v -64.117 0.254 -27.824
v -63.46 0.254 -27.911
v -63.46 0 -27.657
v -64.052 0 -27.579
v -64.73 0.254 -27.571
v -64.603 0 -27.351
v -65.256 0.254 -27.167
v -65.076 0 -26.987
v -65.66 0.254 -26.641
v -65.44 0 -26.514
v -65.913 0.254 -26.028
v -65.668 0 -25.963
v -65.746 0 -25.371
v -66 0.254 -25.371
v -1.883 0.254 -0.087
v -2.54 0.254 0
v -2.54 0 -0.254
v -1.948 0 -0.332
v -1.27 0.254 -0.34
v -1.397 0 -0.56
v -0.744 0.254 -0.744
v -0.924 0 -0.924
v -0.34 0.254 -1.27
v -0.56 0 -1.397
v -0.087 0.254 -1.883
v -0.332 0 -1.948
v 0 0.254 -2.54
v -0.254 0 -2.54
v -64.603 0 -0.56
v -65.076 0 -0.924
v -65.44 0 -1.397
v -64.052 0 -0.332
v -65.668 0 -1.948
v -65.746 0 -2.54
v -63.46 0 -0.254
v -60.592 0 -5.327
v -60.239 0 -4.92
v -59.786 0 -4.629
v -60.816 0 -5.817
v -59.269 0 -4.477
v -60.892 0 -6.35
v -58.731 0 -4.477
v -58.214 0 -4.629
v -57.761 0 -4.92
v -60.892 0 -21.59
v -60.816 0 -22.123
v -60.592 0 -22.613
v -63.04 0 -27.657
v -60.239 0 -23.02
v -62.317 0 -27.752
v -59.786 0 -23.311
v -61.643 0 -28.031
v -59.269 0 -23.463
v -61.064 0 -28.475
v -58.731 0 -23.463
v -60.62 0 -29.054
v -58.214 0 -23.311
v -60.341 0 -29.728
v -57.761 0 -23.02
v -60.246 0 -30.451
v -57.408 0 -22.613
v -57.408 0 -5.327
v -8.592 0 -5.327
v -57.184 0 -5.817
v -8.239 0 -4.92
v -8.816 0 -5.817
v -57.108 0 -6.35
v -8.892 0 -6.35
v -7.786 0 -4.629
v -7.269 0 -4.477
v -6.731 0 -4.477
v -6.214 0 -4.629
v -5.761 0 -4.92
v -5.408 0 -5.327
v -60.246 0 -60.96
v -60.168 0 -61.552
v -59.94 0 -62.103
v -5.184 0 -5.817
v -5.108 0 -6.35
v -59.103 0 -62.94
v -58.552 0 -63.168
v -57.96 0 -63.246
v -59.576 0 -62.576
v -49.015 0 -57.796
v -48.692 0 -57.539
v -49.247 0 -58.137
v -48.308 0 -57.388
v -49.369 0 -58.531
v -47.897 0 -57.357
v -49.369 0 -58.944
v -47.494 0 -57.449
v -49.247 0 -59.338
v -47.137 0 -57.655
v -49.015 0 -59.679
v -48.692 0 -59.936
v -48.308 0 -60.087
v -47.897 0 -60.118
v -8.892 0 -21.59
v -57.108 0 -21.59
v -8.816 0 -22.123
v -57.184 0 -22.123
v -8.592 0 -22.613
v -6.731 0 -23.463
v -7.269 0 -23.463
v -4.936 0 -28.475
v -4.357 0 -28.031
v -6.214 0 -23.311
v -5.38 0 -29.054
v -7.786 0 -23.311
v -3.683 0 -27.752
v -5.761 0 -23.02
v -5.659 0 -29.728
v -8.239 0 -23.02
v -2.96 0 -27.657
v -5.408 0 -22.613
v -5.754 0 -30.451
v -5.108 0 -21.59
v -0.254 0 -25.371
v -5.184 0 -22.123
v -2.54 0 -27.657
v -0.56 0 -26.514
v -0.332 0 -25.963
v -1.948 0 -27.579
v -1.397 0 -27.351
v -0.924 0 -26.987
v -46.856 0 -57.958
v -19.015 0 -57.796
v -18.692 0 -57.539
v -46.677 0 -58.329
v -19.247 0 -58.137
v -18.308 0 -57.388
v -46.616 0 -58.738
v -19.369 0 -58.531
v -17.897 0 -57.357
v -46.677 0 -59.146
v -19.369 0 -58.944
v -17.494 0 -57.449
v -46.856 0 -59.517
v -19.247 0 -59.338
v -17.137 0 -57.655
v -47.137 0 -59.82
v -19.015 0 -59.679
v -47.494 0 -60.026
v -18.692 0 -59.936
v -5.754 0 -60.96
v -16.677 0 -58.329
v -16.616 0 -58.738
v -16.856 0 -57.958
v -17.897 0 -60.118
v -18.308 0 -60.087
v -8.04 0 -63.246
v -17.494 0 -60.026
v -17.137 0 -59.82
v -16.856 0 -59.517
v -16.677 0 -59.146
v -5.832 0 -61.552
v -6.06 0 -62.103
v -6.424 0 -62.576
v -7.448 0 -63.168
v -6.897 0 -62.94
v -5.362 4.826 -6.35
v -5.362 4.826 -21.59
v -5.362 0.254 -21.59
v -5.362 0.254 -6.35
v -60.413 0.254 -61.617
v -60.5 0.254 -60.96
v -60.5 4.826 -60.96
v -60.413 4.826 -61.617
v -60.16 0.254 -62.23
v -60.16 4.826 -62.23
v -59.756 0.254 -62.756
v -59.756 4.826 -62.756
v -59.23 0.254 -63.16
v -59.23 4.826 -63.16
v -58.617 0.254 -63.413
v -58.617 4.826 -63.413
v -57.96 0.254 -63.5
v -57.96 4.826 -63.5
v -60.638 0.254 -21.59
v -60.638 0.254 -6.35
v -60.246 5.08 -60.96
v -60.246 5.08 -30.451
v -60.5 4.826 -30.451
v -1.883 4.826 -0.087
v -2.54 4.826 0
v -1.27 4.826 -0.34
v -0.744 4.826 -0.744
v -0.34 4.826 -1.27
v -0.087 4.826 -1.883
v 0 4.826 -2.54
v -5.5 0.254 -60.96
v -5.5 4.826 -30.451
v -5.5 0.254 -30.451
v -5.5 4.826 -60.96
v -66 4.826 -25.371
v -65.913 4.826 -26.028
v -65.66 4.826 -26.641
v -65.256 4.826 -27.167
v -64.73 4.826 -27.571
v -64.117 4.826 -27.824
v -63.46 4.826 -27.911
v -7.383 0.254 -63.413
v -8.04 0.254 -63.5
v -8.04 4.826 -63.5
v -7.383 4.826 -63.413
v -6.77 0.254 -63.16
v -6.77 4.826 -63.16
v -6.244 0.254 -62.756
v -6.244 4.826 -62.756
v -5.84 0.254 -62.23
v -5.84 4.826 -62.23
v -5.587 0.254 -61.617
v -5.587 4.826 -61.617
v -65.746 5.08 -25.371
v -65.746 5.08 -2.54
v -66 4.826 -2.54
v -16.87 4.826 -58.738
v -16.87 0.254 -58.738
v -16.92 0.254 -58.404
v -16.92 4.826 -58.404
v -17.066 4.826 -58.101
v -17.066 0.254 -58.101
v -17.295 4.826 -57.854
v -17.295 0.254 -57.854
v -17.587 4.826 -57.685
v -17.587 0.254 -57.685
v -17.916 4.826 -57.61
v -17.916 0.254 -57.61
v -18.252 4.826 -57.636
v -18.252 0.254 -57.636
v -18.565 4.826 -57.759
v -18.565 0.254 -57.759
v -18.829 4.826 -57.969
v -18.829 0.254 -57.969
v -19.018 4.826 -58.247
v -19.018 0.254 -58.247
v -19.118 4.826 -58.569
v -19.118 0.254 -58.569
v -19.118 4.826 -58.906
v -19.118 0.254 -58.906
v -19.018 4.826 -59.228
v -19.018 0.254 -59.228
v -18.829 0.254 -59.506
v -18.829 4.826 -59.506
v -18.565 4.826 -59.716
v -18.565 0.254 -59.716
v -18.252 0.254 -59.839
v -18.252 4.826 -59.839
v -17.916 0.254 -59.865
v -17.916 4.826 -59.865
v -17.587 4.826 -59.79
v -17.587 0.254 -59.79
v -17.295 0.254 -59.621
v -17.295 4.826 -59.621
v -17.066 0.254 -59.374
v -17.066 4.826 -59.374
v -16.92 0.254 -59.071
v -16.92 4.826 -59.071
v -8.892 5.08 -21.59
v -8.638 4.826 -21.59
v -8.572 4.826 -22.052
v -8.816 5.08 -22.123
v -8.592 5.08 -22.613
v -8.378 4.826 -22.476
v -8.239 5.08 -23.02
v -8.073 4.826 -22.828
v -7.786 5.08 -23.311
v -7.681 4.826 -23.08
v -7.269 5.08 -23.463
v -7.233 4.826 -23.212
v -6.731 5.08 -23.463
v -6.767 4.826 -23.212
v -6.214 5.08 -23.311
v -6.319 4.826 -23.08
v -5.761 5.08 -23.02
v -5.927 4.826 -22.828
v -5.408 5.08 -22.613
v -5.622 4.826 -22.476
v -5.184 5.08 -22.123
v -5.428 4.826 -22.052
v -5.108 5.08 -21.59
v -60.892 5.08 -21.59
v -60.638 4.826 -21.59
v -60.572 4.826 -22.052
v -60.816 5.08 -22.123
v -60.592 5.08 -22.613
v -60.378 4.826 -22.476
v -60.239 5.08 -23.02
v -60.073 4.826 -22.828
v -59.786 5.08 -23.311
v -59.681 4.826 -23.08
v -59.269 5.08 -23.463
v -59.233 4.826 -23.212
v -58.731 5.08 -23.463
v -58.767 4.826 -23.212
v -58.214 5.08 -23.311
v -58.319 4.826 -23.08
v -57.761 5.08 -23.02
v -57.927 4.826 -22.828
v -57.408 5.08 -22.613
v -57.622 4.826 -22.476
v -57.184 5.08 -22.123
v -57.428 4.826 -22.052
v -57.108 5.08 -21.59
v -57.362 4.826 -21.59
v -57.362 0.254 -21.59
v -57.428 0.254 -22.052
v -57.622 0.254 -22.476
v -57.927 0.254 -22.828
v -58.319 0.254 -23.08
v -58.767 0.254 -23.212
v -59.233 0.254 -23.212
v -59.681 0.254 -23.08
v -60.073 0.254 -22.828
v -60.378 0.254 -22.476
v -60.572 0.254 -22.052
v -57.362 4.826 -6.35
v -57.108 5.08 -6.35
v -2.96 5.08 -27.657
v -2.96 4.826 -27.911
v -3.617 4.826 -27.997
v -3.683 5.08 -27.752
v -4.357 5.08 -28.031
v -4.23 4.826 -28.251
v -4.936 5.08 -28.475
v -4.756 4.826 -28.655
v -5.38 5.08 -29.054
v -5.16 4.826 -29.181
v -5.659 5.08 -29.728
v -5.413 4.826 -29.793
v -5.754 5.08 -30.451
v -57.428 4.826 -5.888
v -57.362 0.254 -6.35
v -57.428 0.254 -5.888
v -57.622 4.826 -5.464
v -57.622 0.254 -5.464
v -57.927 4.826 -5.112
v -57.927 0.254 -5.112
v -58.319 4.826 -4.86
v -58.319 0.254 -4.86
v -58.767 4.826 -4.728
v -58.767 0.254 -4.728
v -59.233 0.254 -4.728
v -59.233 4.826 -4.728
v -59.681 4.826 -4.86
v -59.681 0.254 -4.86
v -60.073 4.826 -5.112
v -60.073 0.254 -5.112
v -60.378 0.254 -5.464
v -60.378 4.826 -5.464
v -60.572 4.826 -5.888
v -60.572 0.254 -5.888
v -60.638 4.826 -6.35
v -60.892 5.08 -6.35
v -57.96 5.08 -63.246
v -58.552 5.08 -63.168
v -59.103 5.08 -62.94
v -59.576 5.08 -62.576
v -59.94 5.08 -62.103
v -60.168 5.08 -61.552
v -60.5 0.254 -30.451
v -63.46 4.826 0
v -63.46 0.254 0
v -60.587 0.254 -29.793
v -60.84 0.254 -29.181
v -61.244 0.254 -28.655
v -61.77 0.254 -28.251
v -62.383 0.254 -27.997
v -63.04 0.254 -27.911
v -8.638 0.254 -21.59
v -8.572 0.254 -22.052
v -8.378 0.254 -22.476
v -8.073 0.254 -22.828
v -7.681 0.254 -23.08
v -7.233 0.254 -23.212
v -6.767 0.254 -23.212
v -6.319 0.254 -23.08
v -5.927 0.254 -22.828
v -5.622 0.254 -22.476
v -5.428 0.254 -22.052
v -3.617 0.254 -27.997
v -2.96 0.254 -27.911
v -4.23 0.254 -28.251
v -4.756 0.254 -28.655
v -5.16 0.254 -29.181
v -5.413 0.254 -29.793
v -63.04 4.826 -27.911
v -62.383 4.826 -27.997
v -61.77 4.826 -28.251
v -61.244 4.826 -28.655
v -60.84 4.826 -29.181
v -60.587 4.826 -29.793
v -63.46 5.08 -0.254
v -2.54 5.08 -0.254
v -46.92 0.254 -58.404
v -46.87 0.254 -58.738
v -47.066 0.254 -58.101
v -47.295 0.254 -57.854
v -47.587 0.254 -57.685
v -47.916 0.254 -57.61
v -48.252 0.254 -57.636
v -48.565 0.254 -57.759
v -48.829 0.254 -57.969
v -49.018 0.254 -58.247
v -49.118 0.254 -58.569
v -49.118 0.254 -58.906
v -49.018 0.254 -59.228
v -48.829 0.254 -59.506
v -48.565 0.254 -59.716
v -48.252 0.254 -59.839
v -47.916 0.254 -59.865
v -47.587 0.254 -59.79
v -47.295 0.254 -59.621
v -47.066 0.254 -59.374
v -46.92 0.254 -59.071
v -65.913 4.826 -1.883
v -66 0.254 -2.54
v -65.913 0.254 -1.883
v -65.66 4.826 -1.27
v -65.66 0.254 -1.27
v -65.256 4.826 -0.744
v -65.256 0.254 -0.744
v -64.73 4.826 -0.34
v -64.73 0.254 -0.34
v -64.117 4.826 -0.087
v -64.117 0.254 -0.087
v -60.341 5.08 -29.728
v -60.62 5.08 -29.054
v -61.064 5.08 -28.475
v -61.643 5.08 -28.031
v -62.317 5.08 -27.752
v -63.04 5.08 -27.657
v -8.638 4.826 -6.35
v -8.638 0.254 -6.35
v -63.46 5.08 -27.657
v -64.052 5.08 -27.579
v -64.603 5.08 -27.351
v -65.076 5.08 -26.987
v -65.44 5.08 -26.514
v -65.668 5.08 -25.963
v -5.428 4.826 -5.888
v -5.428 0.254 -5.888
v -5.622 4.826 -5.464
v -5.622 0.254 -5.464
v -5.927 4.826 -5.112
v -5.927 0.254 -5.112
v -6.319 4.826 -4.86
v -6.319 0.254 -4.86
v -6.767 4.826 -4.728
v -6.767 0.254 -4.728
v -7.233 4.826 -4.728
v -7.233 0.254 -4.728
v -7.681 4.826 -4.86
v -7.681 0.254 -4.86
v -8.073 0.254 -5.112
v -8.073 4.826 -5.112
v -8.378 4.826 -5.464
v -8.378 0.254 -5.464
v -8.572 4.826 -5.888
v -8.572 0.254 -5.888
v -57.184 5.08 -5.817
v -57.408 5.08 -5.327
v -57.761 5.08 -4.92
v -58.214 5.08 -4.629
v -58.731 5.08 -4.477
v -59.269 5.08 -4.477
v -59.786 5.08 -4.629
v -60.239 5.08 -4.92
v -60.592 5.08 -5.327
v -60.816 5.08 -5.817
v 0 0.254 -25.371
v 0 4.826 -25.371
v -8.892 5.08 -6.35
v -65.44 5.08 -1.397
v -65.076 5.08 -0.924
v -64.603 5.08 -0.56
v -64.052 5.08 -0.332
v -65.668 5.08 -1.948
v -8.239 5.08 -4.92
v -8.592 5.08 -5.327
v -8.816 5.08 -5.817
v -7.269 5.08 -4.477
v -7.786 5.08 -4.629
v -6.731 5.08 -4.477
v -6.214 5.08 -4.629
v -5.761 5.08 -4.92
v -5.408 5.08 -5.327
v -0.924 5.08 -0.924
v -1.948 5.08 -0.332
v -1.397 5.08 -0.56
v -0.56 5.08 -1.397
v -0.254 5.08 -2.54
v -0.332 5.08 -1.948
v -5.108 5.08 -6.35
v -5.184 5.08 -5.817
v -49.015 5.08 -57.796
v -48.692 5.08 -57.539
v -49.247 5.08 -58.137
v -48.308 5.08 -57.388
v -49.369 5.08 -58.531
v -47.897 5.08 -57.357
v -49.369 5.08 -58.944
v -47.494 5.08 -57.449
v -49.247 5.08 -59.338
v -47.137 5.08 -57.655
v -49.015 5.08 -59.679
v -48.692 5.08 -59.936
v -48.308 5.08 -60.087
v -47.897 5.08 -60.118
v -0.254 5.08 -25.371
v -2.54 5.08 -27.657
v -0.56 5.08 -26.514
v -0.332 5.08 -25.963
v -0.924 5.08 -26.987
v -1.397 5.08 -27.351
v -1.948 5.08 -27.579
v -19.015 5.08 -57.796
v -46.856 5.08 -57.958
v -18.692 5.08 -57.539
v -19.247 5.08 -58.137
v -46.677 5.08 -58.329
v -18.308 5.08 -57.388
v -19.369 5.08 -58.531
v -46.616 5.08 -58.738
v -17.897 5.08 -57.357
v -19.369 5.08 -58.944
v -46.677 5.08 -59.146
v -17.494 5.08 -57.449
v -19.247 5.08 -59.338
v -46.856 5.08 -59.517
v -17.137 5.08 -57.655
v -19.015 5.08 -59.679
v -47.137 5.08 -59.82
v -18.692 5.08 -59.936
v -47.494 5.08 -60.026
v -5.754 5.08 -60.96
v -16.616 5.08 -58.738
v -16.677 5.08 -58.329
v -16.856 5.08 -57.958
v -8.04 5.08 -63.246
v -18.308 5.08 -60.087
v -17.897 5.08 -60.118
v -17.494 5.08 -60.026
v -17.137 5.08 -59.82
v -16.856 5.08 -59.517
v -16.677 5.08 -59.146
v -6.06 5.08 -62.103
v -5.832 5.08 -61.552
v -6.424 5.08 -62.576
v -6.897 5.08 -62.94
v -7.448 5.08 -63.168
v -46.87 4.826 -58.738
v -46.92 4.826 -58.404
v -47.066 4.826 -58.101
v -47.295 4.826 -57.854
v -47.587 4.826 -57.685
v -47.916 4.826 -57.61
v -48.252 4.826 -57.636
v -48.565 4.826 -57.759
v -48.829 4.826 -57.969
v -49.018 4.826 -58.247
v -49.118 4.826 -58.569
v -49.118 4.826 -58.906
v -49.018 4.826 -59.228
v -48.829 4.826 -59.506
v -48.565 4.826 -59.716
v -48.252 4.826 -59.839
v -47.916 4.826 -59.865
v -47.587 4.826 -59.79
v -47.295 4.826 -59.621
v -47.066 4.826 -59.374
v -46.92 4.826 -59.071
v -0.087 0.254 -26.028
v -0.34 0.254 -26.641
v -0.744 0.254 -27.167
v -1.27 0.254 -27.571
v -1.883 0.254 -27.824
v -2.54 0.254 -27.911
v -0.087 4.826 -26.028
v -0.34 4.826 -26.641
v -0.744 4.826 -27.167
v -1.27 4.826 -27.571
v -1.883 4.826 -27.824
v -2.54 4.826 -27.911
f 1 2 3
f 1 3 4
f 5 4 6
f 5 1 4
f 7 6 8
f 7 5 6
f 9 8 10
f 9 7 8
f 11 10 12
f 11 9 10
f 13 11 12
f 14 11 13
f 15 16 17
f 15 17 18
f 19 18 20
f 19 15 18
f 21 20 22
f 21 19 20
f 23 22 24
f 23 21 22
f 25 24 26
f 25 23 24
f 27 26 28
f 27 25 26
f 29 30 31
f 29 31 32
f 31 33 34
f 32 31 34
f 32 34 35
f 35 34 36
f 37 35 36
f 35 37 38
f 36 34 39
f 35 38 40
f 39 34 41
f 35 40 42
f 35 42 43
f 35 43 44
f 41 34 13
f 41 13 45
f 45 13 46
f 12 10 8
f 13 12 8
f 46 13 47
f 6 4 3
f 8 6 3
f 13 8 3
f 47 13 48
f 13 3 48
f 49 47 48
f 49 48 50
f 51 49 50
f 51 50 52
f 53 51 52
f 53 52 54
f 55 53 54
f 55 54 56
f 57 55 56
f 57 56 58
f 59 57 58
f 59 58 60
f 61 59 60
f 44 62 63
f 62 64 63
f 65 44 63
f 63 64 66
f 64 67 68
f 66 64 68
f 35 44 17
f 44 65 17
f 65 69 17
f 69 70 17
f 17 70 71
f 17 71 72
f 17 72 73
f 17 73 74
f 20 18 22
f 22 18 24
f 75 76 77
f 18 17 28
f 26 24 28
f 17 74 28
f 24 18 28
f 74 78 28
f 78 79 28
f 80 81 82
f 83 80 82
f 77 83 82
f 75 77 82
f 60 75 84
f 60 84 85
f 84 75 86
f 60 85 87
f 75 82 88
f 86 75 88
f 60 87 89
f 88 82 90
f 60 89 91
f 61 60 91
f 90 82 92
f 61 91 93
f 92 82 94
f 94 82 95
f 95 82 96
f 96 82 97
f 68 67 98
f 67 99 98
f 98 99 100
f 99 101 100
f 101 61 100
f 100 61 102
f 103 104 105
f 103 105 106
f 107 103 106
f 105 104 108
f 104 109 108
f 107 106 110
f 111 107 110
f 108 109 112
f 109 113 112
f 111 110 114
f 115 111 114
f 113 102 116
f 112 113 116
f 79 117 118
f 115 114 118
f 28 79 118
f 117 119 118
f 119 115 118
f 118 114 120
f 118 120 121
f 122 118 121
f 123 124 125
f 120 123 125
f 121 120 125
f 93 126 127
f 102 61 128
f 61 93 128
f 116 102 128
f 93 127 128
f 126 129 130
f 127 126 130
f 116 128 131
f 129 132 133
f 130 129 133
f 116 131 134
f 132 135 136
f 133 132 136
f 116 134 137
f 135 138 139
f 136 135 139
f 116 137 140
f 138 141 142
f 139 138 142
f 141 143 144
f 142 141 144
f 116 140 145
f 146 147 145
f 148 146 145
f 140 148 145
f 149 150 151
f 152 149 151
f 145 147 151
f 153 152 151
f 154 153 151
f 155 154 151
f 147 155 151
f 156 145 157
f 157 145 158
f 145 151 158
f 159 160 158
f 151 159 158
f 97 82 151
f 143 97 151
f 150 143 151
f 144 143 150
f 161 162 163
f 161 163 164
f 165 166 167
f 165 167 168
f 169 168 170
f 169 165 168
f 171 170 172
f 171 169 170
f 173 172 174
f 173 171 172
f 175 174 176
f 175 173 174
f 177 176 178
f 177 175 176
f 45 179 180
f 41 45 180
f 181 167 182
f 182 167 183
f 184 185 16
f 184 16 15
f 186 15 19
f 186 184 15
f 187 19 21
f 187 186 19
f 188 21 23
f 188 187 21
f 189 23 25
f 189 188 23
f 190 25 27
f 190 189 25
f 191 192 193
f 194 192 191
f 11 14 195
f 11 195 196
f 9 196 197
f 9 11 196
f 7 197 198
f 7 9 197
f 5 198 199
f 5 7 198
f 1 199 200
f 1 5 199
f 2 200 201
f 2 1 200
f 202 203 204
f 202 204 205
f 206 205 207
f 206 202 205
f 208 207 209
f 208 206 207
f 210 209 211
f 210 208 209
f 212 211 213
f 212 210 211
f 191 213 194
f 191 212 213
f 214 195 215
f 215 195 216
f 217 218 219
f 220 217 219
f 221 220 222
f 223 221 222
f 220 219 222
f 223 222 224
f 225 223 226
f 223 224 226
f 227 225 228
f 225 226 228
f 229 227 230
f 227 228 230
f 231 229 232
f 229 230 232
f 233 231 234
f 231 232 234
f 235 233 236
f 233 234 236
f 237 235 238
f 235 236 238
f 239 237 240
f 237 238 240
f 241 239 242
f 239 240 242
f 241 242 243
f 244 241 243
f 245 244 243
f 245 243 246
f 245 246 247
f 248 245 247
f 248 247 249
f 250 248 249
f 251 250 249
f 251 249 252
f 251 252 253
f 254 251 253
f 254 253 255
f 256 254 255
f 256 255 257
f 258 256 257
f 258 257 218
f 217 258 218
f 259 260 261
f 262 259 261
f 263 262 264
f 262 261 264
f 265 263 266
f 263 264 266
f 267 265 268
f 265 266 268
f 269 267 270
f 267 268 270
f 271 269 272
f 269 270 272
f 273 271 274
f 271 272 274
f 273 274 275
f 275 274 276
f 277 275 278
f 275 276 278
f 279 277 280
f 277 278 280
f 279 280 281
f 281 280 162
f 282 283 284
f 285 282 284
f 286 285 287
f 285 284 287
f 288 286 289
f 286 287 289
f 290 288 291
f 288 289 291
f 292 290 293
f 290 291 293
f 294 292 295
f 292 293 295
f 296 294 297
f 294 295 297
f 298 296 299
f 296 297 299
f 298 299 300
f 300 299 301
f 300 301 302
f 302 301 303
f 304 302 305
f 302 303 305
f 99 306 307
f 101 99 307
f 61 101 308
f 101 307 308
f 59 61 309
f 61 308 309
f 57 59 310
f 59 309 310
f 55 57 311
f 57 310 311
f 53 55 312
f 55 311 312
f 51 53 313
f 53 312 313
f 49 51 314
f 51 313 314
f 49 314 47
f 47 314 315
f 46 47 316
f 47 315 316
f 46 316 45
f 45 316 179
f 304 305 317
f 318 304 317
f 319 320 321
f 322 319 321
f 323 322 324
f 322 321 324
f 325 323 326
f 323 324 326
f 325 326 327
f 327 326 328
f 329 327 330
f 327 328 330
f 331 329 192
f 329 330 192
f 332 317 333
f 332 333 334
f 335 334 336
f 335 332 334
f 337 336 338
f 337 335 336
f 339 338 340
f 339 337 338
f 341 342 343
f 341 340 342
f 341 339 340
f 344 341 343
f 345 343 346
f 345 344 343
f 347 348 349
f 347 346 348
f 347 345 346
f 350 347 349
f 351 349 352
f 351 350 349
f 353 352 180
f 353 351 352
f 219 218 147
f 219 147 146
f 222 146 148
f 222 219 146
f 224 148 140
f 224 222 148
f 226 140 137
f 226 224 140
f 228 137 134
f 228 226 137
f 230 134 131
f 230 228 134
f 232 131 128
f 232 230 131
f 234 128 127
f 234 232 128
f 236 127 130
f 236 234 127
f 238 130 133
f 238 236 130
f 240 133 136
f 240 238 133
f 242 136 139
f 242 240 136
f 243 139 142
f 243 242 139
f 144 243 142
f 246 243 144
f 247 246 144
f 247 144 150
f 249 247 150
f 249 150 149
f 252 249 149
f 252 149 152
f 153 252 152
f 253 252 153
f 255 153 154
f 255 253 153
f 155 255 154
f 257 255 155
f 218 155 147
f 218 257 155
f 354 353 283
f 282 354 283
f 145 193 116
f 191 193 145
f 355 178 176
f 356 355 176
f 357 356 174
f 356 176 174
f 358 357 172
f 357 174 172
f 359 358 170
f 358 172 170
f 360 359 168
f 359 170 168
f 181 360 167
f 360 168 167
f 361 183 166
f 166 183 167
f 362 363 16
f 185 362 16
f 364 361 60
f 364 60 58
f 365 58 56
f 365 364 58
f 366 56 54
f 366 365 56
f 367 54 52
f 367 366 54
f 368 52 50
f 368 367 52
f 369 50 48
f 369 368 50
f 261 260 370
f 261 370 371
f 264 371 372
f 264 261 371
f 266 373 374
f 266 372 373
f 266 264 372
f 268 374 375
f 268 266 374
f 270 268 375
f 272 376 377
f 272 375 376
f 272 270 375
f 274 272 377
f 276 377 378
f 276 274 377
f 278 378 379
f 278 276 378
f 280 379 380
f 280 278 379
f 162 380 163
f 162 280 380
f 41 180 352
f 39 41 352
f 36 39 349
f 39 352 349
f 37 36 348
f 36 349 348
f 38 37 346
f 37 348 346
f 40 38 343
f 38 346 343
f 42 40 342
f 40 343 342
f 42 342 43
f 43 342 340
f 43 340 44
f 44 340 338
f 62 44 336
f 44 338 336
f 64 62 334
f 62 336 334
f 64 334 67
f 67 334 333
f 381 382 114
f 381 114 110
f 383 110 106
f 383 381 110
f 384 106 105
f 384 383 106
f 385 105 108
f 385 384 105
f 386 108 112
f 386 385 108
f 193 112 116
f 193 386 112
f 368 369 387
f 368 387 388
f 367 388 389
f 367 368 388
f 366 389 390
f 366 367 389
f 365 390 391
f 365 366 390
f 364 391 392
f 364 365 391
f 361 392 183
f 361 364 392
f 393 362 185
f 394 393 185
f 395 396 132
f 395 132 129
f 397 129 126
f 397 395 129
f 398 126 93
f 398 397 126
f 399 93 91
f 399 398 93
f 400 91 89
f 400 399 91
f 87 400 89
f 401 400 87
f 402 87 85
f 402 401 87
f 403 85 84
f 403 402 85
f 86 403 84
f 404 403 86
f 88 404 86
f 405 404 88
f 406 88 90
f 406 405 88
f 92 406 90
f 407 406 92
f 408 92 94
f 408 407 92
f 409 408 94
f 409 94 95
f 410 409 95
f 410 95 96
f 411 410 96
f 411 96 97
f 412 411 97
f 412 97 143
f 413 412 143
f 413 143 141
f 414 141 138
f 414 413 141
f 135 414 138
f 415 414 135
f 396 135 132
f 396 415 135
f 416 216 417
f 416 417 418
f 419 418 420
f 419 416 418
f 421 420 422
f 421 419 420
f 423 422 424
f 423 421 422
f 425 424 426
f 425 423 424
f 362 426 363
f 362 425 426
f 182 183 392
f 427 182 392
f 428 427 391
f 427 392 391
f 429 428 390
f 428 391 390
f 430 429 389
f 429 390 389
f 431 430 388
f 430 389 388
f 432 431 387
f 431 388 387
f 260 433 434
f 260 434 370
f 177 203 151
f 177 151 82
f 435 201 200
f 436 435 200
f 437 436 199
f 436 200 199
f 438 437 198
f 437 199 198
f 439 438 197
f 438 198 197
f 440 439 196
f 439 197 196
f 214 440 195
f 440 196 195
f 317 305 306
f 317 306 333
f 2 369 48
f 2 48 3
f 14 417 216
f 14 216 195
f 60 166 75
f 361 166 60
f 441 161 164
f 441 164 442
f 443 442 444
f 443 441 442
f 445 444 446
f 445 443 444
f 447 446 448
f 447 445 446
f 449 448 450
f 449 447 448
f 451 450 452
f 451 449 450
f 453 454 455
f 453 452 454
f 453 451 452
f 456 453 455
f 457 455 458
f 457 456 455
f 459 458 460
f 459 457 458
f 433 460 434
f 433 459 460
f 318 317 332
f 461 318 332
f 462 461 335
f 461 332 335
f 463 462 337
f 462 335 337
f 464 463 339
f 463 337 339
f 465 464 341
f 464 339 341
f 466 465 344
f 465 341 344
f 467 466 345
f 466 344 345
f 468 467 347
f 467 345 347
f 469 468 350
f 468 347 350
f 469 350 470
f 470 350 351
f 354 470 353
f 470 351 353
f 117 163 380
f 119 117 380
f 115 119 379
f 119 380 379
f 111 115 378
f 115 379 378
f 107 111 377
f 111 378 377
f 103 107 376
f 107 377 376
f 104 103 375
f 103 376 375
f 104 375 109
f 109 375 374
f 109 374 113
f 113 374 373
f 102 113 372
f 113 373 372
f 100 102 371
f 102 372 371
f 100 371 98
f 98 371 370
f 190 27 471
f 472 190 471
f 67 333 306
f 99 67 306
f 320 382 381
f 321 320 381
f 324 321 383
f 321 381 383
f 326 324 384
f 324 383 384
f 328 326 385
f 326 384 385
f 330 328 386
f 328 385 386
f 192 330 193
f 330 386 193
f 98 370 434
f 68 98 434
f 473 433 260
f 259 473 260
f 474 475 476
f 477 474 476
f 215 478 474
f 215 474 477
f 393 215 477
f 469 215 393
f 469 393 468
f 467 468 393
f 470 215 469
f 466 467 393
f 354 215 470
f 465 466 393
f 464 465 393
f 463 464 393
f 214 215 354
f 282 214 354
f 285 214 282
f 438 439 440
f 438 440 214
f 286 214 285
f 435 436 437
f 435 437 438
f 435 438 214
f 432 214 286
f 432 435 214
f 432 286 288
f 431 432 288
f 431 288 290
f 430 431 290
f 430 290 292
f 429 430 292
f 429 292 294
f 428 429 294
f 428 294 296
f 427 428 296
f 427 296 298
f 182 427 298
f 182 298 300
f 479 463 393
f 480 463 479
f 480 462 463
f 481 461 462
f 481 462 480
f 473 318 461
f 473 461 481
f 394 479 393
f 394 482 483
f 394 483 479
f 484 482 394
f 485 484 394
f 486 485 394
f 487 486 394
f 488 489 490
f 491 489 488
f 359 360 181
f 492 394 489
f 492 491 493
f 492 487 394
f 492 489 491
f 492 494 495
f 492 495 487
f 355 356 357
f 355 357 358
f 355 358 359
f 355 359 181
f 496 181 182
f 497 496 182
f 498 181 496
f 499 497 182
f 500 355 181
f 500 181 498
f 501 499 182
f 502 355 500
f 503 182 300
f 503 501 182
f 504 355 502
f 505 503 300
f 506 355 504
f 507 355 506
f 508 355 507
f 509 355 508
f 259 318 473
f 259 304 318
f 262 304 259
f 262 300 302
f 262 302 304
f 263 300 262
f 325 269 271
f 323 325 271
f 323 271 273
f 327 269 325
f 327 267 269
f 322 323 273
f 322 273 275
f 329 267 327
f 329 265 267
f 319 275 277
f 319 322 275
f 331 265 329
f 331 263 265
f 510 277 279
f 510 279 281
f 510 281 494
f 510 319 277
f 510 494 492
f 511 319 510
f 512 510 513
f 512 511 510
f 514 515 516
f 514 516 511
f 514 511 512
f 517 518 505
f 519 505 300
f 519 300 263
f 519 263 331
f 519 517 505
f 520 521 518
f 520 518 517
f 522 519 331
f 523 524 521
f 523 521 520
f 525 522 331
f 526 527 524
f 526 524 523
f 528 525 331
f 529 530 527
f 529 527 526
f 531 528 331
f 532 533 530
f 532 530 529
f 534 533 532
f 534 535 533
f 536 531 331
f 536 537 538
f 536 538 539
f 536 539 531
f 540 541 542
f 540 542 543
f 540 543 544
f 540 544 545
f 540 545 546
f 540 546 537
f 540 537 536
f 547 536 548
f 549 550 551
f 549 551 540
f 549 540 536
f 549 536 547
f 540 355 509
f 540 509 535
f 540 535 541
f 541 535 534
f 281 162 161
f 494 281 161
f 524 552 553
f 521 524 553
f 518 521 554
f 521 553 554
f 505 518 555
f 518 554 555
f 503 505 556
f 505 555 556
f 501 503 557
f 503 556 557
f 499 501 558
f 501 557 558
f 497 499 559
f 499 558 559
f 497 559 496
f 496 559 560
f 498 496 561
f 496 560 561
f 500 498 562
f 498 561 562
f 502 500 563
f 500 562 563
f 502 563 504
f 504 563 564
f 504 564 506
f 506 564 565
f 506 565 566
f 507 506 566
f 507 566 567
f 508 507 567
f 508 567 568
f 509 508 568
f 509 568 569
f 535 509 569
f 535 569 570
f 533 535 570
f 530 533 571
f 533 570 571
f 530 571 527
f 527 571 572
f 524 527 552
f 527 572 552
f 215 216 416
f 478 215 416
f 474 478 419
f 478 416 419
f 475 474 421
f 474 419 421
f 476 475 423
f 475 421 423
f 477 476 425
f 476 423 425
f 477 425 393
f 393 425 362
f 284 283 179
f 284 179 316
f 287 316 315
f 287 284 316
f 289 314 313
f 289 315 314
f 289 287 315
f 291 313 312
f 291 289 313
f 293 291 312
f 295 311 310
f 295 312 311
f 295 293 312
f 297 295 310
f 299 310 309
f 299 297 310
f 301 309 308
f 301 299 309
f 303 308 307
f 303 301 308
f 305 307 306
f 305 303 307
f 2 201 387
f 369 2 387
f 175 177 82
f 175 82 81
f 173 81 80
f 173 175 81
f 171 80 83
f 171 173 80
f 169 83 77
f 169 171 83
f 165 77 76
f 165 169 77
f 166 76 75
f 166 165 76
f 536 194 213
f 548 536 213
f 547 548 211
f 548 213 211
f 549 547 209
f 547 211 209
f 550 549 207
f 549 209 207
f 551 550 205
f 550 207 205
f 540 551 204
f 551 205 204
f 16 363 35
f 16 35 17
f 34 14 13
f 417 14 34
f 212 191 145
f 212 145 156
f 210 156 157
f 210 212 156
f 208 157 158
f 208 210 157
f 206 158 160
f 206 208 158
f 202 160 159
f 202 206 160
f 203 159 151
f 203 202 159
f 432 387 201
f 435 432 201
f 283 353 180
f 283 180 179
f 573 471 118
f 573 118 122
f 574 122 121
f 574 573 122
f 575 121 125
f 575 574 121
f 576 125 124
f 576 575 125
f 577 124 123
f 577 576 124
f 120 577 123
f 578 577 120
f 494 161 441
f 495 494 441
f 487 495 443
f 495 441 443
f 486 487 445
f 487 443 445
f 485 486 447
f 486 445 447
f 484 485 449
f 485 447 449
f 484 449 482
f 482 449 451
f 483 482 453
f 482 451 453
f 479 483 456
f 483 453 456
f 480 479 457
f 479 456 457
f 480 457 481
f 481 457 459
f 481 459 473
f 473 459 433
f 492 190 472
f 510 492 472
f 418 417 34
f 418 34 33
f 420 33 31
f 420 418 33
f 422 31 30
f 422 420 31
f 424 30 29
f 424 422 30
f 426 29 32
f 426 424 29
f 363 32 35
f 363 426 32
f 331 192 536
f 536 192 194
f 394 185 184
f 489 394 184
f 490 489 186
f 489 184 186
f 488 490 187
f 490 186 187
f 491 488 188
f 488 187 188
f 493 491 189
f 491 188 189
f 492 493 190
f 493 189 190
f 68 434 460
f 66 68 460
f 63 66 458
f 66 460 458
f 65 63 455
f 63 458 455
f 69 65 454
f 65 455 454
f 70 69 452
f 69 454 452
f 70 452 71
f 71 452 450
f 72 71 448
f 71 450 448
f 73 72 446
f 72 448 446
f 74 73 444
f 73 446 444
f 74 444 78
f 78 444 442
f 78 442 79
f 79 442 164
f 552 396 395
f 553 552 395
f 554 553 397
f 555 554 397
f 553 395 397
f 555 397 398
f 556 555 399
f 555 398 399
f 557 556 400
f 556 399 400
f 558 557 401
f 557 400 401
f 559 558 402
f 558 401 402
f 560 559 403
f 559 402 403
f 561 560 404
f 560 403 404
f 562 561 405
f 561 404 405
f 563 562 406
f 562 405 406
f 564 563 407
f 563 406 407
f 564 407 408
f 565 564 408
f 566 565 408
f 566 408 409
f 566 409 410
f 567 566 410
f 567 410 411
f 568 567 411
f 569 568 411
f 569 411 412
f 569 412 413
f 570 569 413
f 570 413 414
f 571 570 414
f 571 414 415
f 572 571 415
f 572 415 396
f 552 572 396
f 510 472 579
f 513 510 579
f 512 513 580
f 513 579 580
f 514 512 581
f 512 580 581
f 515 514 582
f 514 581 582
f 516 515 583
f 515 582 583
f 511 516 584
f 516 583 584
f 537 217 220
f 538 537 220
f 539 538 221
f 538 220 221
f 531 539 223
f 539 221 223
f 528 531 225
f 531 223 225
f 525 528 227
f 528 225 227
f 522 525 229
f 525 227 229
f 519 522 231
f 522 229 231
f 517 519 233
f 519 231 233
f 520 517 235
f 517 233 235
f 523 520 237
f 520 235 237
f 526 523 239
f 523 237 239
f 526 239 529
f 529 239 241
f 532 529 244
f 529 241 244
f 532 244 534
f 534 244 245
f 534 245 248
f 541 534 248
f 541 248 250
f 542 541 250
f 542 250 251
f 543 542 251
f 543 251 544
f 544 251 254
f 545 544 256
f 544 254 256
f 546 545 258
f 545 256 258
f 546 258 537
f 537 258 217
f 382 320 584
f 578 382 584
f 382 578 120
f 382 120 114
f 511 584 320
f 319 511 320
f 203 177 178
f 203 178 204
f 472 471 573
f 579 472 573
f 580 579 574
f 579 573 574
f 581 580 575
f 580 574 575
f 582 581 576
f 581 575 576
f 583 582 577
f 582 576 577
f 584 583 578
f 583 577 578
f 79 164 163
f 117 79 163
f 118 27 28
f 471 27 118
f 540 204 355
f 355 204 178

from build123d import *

# Parameters (mm, degrees)
SKETCH1_W                 = 66
SKETCH1_H                 = 63.5
BOSS_EXTRUDE1_DEPTH       = 5.08
SKETCH6_W                 = 5.5
SKETCH6_H                 = 35.589114281
CUT_EXTRUDE1_DEPTH        = 5.08
F_4_40_TAPPED_HOLE1_D     = 2.2606
F_4_40_TAPPED_HOLE1_DEPTH = 7.5946
F_4_40_TAPPED_HOLE1_TIP   = 0.679152758
FILLET1_R                 = 2.54
FILLET2_R                 = 2.54
CUT_EXTRUDE2_DEPTH        = 6.08
CHAMFER1_SIZE             = 0.254


with BuildPart() as part:
    # Sketch1 → Boss-Extrude1 (new body)
    with BuildSketch(Plane(origin=(0, 0, 0), x_dir=(1, 0, 0), z_dir=(0, 1, 0))):
        with Locations((-33, 31.75)):
            Rectangle(SKETCH1_W, SKETCH1_H)
    extrude(amount=BOSS_EXTRUDE1_DEPTH)

    # Sketch6 → Cut-Extrude1 (cut)
    with BuildSketch(Plane(origin=(0, 5.08, 0), x_dir=(1, 0, 0), z_dir=(0, 1, 0))):
        with Locations((-63.25, 45.70544286)):
            Rectangle(SKETCH6_W, SKETCH6_H)
        with Locations((-2.75, 45.70544286)):
            Rectangle(SKETCH6_W, SKETCH6_H)
    extrude(amount=-CUT_EXTRUDE1_DEPTH, mode=Mode.SUBTRACT)

    # #4-40 Tapped Hole1
    with Locations(Plane(origin=(0, 5.08, 0), x_dir=(-1, 0, 0), z_dir=(0, 1, 0))):
        with Locations((48, -58.7375), (18, -58.7375)):
            Hole(F_4_40_TAPPED_HOLE1_D / 2, depth=F_4_40_TAPPED_HOLE1_DEPTH)
            with Locations((0, 0, -(F_4_40_TAPPED_HOLE1_DEPTH + F_4_40_TAPPED_HOLE1_TIP / 2))):  # 118° drill point
                Cone(0, F_4_40_TAPPED_HOLE1_D / 2, F_4_40_TAPPED_HOLE1_TIP, mode=Mode.SUBTRACT)

    # Fillet1
    fillet1_edges = [part.edges().sort_by_distance(p)[0] for p in [
        (-60.5, 2.54, -63.5),
        (-60.5, 2.54, -27.910885719),
        (-5.5, 2.54, -27.910885719),
        (-5.5, 2.54, -63.5),
        (0, 2.54, 0),
        (-66, 2.54, 0),
    ]]
    fillet(fillet1_edges, radius=FILLET1_R)

    # Fillet2
    fillet2_edges = [part.edges().sort_by_distance(p)[0] for p in [
        (-66, 2.54, -27.910885719),
        (0, 2.54, -27.910885719),
    ]]
    fillet(fillet2_edges, radius=FILLET2_R)

    # Sketch9 → Cut-Extrude2 (cut, through all)
    with BuildSketch(Plane(origin=(0, 5.08, 0), x_dir=(1, 0, 0), z_dir=(0, 1, 0))):
        with BuildLine():
            Line((-60.6383, 6.35), (-60.6383, 21.59))
            ThreePointArc((-60.6383, 21.59), (-59, 23.2283), (-57.3617, 21.59))
            Line((-57.3617, 21.59), (-57.3617, 6.35))
            ThreePointArc((-57.3617, 6.35), (-59, 4.7117), (-60.6383, 6.35))
        make_face()
        with BuildLine():
            Line((-8.6383, 6.35), (-8.6383, 21.59))
            ThreePointArc((-8.6383, 21.59), (-7, 23.2283), (-5.3617, 21.59))
            Line((-5.3617, 21.59), (-5.3617, 6.35))
            ThreePointArc((-5.3617, 6.35), (-7, 4.7117), (-8.6383, 6.35))
        make_face()
    extrude(amount=-CUT_EXTRUDE2_DEPTH, mode=Mode.SUBTRACT)

    # Chamfer1
    chamfer1_edges = [part.edges().sort_by_distance(p)[0] for p in [
        (-59, 0, -4.7117),
        (-60.6383, 0, -13.97),
        (-59, 0, -23.2283),
        (-57.3617, 0, -13.97),
        (-59, 5.08, -4.7117),
        (-57.3617, 5.08, -13.97),
        (-59, 5.08, -23.2283),
        (-60.6383, 5.08, -13.97),
        (-7, 0, -4.7117),
        (-8.6383, 0, -13.97),
        (-7, 0, -23.2283),
        (-5.3617, 0, -13.97),
        (-7, 5.08, -4.7117),
        (-5.3617, 5.08, -13.97),
        (-7, 5.08, -23.2283),
        (-8.6383, 5.08, -13.97),
        (-19.1303, 0, -58.7375),
        (-19.1303, 5.08, -58.7375),
        (-49.1303, 0, -58.7375),
        (-49.1303, 5.08, -58.7375),
        (-33, 0, 0),
        (-33, 5.08, 0),
        (-5.5, 0, -45.705442859),
        (-2.75, 0, -27.910885719),
        (0, 0, -13.955442859),
        (-60.5, 0, -45.705442859),
        (-33, 0, -63.5),
        (-59.756051224, 0, -62.756051224),
        (-6.243948776, 0, -62.756051224),
        (-0.743948776, 0, -0.743948776),
        (-65.256051224, 0, -0.743948776),
        (-2.75, 5.08, -27.910885719),
        (-5.5, 5.08, -45.705442859),
        (-33, 5.08, -63.5),
        (-60.5, 5.08, -45.705442859),
        (0, 5.08, -13.955442859),
        (-59.756051224, 5.08, -62.756051224),
        (-6.243948776, 5.08, -62.756051224),
        (-0.743948776, 5.08, -0.743948776),
        (-65.256051224, 5.08, -0.743948776),
        (-4.756051224, 5.08, -28.654834495),
        (-4.756051224, 0, -28.654834495),
        (-61.243948776, 5.08, -28.654834495),
        (-61.243948776, 0, -28.654834495),
        (-63.25, 5.08, -27.910885719),
        (-63.25, 0, -27.910885719),
        (-66, 5.08, -13.955442859),
        (-0.743948776, 5.08, -27.166936943),
        (-65.256051224, 5.08, -27.166936943),
        (-66, 0, -13.955442859),
        (-0.743948776, 0, -27.166936943),
        (-65.256051224, 0, -27.166936943),
    ]]
    chamfer(chamfer1_edges, length=CHAMFER1_SIZE)


solid = part.part
